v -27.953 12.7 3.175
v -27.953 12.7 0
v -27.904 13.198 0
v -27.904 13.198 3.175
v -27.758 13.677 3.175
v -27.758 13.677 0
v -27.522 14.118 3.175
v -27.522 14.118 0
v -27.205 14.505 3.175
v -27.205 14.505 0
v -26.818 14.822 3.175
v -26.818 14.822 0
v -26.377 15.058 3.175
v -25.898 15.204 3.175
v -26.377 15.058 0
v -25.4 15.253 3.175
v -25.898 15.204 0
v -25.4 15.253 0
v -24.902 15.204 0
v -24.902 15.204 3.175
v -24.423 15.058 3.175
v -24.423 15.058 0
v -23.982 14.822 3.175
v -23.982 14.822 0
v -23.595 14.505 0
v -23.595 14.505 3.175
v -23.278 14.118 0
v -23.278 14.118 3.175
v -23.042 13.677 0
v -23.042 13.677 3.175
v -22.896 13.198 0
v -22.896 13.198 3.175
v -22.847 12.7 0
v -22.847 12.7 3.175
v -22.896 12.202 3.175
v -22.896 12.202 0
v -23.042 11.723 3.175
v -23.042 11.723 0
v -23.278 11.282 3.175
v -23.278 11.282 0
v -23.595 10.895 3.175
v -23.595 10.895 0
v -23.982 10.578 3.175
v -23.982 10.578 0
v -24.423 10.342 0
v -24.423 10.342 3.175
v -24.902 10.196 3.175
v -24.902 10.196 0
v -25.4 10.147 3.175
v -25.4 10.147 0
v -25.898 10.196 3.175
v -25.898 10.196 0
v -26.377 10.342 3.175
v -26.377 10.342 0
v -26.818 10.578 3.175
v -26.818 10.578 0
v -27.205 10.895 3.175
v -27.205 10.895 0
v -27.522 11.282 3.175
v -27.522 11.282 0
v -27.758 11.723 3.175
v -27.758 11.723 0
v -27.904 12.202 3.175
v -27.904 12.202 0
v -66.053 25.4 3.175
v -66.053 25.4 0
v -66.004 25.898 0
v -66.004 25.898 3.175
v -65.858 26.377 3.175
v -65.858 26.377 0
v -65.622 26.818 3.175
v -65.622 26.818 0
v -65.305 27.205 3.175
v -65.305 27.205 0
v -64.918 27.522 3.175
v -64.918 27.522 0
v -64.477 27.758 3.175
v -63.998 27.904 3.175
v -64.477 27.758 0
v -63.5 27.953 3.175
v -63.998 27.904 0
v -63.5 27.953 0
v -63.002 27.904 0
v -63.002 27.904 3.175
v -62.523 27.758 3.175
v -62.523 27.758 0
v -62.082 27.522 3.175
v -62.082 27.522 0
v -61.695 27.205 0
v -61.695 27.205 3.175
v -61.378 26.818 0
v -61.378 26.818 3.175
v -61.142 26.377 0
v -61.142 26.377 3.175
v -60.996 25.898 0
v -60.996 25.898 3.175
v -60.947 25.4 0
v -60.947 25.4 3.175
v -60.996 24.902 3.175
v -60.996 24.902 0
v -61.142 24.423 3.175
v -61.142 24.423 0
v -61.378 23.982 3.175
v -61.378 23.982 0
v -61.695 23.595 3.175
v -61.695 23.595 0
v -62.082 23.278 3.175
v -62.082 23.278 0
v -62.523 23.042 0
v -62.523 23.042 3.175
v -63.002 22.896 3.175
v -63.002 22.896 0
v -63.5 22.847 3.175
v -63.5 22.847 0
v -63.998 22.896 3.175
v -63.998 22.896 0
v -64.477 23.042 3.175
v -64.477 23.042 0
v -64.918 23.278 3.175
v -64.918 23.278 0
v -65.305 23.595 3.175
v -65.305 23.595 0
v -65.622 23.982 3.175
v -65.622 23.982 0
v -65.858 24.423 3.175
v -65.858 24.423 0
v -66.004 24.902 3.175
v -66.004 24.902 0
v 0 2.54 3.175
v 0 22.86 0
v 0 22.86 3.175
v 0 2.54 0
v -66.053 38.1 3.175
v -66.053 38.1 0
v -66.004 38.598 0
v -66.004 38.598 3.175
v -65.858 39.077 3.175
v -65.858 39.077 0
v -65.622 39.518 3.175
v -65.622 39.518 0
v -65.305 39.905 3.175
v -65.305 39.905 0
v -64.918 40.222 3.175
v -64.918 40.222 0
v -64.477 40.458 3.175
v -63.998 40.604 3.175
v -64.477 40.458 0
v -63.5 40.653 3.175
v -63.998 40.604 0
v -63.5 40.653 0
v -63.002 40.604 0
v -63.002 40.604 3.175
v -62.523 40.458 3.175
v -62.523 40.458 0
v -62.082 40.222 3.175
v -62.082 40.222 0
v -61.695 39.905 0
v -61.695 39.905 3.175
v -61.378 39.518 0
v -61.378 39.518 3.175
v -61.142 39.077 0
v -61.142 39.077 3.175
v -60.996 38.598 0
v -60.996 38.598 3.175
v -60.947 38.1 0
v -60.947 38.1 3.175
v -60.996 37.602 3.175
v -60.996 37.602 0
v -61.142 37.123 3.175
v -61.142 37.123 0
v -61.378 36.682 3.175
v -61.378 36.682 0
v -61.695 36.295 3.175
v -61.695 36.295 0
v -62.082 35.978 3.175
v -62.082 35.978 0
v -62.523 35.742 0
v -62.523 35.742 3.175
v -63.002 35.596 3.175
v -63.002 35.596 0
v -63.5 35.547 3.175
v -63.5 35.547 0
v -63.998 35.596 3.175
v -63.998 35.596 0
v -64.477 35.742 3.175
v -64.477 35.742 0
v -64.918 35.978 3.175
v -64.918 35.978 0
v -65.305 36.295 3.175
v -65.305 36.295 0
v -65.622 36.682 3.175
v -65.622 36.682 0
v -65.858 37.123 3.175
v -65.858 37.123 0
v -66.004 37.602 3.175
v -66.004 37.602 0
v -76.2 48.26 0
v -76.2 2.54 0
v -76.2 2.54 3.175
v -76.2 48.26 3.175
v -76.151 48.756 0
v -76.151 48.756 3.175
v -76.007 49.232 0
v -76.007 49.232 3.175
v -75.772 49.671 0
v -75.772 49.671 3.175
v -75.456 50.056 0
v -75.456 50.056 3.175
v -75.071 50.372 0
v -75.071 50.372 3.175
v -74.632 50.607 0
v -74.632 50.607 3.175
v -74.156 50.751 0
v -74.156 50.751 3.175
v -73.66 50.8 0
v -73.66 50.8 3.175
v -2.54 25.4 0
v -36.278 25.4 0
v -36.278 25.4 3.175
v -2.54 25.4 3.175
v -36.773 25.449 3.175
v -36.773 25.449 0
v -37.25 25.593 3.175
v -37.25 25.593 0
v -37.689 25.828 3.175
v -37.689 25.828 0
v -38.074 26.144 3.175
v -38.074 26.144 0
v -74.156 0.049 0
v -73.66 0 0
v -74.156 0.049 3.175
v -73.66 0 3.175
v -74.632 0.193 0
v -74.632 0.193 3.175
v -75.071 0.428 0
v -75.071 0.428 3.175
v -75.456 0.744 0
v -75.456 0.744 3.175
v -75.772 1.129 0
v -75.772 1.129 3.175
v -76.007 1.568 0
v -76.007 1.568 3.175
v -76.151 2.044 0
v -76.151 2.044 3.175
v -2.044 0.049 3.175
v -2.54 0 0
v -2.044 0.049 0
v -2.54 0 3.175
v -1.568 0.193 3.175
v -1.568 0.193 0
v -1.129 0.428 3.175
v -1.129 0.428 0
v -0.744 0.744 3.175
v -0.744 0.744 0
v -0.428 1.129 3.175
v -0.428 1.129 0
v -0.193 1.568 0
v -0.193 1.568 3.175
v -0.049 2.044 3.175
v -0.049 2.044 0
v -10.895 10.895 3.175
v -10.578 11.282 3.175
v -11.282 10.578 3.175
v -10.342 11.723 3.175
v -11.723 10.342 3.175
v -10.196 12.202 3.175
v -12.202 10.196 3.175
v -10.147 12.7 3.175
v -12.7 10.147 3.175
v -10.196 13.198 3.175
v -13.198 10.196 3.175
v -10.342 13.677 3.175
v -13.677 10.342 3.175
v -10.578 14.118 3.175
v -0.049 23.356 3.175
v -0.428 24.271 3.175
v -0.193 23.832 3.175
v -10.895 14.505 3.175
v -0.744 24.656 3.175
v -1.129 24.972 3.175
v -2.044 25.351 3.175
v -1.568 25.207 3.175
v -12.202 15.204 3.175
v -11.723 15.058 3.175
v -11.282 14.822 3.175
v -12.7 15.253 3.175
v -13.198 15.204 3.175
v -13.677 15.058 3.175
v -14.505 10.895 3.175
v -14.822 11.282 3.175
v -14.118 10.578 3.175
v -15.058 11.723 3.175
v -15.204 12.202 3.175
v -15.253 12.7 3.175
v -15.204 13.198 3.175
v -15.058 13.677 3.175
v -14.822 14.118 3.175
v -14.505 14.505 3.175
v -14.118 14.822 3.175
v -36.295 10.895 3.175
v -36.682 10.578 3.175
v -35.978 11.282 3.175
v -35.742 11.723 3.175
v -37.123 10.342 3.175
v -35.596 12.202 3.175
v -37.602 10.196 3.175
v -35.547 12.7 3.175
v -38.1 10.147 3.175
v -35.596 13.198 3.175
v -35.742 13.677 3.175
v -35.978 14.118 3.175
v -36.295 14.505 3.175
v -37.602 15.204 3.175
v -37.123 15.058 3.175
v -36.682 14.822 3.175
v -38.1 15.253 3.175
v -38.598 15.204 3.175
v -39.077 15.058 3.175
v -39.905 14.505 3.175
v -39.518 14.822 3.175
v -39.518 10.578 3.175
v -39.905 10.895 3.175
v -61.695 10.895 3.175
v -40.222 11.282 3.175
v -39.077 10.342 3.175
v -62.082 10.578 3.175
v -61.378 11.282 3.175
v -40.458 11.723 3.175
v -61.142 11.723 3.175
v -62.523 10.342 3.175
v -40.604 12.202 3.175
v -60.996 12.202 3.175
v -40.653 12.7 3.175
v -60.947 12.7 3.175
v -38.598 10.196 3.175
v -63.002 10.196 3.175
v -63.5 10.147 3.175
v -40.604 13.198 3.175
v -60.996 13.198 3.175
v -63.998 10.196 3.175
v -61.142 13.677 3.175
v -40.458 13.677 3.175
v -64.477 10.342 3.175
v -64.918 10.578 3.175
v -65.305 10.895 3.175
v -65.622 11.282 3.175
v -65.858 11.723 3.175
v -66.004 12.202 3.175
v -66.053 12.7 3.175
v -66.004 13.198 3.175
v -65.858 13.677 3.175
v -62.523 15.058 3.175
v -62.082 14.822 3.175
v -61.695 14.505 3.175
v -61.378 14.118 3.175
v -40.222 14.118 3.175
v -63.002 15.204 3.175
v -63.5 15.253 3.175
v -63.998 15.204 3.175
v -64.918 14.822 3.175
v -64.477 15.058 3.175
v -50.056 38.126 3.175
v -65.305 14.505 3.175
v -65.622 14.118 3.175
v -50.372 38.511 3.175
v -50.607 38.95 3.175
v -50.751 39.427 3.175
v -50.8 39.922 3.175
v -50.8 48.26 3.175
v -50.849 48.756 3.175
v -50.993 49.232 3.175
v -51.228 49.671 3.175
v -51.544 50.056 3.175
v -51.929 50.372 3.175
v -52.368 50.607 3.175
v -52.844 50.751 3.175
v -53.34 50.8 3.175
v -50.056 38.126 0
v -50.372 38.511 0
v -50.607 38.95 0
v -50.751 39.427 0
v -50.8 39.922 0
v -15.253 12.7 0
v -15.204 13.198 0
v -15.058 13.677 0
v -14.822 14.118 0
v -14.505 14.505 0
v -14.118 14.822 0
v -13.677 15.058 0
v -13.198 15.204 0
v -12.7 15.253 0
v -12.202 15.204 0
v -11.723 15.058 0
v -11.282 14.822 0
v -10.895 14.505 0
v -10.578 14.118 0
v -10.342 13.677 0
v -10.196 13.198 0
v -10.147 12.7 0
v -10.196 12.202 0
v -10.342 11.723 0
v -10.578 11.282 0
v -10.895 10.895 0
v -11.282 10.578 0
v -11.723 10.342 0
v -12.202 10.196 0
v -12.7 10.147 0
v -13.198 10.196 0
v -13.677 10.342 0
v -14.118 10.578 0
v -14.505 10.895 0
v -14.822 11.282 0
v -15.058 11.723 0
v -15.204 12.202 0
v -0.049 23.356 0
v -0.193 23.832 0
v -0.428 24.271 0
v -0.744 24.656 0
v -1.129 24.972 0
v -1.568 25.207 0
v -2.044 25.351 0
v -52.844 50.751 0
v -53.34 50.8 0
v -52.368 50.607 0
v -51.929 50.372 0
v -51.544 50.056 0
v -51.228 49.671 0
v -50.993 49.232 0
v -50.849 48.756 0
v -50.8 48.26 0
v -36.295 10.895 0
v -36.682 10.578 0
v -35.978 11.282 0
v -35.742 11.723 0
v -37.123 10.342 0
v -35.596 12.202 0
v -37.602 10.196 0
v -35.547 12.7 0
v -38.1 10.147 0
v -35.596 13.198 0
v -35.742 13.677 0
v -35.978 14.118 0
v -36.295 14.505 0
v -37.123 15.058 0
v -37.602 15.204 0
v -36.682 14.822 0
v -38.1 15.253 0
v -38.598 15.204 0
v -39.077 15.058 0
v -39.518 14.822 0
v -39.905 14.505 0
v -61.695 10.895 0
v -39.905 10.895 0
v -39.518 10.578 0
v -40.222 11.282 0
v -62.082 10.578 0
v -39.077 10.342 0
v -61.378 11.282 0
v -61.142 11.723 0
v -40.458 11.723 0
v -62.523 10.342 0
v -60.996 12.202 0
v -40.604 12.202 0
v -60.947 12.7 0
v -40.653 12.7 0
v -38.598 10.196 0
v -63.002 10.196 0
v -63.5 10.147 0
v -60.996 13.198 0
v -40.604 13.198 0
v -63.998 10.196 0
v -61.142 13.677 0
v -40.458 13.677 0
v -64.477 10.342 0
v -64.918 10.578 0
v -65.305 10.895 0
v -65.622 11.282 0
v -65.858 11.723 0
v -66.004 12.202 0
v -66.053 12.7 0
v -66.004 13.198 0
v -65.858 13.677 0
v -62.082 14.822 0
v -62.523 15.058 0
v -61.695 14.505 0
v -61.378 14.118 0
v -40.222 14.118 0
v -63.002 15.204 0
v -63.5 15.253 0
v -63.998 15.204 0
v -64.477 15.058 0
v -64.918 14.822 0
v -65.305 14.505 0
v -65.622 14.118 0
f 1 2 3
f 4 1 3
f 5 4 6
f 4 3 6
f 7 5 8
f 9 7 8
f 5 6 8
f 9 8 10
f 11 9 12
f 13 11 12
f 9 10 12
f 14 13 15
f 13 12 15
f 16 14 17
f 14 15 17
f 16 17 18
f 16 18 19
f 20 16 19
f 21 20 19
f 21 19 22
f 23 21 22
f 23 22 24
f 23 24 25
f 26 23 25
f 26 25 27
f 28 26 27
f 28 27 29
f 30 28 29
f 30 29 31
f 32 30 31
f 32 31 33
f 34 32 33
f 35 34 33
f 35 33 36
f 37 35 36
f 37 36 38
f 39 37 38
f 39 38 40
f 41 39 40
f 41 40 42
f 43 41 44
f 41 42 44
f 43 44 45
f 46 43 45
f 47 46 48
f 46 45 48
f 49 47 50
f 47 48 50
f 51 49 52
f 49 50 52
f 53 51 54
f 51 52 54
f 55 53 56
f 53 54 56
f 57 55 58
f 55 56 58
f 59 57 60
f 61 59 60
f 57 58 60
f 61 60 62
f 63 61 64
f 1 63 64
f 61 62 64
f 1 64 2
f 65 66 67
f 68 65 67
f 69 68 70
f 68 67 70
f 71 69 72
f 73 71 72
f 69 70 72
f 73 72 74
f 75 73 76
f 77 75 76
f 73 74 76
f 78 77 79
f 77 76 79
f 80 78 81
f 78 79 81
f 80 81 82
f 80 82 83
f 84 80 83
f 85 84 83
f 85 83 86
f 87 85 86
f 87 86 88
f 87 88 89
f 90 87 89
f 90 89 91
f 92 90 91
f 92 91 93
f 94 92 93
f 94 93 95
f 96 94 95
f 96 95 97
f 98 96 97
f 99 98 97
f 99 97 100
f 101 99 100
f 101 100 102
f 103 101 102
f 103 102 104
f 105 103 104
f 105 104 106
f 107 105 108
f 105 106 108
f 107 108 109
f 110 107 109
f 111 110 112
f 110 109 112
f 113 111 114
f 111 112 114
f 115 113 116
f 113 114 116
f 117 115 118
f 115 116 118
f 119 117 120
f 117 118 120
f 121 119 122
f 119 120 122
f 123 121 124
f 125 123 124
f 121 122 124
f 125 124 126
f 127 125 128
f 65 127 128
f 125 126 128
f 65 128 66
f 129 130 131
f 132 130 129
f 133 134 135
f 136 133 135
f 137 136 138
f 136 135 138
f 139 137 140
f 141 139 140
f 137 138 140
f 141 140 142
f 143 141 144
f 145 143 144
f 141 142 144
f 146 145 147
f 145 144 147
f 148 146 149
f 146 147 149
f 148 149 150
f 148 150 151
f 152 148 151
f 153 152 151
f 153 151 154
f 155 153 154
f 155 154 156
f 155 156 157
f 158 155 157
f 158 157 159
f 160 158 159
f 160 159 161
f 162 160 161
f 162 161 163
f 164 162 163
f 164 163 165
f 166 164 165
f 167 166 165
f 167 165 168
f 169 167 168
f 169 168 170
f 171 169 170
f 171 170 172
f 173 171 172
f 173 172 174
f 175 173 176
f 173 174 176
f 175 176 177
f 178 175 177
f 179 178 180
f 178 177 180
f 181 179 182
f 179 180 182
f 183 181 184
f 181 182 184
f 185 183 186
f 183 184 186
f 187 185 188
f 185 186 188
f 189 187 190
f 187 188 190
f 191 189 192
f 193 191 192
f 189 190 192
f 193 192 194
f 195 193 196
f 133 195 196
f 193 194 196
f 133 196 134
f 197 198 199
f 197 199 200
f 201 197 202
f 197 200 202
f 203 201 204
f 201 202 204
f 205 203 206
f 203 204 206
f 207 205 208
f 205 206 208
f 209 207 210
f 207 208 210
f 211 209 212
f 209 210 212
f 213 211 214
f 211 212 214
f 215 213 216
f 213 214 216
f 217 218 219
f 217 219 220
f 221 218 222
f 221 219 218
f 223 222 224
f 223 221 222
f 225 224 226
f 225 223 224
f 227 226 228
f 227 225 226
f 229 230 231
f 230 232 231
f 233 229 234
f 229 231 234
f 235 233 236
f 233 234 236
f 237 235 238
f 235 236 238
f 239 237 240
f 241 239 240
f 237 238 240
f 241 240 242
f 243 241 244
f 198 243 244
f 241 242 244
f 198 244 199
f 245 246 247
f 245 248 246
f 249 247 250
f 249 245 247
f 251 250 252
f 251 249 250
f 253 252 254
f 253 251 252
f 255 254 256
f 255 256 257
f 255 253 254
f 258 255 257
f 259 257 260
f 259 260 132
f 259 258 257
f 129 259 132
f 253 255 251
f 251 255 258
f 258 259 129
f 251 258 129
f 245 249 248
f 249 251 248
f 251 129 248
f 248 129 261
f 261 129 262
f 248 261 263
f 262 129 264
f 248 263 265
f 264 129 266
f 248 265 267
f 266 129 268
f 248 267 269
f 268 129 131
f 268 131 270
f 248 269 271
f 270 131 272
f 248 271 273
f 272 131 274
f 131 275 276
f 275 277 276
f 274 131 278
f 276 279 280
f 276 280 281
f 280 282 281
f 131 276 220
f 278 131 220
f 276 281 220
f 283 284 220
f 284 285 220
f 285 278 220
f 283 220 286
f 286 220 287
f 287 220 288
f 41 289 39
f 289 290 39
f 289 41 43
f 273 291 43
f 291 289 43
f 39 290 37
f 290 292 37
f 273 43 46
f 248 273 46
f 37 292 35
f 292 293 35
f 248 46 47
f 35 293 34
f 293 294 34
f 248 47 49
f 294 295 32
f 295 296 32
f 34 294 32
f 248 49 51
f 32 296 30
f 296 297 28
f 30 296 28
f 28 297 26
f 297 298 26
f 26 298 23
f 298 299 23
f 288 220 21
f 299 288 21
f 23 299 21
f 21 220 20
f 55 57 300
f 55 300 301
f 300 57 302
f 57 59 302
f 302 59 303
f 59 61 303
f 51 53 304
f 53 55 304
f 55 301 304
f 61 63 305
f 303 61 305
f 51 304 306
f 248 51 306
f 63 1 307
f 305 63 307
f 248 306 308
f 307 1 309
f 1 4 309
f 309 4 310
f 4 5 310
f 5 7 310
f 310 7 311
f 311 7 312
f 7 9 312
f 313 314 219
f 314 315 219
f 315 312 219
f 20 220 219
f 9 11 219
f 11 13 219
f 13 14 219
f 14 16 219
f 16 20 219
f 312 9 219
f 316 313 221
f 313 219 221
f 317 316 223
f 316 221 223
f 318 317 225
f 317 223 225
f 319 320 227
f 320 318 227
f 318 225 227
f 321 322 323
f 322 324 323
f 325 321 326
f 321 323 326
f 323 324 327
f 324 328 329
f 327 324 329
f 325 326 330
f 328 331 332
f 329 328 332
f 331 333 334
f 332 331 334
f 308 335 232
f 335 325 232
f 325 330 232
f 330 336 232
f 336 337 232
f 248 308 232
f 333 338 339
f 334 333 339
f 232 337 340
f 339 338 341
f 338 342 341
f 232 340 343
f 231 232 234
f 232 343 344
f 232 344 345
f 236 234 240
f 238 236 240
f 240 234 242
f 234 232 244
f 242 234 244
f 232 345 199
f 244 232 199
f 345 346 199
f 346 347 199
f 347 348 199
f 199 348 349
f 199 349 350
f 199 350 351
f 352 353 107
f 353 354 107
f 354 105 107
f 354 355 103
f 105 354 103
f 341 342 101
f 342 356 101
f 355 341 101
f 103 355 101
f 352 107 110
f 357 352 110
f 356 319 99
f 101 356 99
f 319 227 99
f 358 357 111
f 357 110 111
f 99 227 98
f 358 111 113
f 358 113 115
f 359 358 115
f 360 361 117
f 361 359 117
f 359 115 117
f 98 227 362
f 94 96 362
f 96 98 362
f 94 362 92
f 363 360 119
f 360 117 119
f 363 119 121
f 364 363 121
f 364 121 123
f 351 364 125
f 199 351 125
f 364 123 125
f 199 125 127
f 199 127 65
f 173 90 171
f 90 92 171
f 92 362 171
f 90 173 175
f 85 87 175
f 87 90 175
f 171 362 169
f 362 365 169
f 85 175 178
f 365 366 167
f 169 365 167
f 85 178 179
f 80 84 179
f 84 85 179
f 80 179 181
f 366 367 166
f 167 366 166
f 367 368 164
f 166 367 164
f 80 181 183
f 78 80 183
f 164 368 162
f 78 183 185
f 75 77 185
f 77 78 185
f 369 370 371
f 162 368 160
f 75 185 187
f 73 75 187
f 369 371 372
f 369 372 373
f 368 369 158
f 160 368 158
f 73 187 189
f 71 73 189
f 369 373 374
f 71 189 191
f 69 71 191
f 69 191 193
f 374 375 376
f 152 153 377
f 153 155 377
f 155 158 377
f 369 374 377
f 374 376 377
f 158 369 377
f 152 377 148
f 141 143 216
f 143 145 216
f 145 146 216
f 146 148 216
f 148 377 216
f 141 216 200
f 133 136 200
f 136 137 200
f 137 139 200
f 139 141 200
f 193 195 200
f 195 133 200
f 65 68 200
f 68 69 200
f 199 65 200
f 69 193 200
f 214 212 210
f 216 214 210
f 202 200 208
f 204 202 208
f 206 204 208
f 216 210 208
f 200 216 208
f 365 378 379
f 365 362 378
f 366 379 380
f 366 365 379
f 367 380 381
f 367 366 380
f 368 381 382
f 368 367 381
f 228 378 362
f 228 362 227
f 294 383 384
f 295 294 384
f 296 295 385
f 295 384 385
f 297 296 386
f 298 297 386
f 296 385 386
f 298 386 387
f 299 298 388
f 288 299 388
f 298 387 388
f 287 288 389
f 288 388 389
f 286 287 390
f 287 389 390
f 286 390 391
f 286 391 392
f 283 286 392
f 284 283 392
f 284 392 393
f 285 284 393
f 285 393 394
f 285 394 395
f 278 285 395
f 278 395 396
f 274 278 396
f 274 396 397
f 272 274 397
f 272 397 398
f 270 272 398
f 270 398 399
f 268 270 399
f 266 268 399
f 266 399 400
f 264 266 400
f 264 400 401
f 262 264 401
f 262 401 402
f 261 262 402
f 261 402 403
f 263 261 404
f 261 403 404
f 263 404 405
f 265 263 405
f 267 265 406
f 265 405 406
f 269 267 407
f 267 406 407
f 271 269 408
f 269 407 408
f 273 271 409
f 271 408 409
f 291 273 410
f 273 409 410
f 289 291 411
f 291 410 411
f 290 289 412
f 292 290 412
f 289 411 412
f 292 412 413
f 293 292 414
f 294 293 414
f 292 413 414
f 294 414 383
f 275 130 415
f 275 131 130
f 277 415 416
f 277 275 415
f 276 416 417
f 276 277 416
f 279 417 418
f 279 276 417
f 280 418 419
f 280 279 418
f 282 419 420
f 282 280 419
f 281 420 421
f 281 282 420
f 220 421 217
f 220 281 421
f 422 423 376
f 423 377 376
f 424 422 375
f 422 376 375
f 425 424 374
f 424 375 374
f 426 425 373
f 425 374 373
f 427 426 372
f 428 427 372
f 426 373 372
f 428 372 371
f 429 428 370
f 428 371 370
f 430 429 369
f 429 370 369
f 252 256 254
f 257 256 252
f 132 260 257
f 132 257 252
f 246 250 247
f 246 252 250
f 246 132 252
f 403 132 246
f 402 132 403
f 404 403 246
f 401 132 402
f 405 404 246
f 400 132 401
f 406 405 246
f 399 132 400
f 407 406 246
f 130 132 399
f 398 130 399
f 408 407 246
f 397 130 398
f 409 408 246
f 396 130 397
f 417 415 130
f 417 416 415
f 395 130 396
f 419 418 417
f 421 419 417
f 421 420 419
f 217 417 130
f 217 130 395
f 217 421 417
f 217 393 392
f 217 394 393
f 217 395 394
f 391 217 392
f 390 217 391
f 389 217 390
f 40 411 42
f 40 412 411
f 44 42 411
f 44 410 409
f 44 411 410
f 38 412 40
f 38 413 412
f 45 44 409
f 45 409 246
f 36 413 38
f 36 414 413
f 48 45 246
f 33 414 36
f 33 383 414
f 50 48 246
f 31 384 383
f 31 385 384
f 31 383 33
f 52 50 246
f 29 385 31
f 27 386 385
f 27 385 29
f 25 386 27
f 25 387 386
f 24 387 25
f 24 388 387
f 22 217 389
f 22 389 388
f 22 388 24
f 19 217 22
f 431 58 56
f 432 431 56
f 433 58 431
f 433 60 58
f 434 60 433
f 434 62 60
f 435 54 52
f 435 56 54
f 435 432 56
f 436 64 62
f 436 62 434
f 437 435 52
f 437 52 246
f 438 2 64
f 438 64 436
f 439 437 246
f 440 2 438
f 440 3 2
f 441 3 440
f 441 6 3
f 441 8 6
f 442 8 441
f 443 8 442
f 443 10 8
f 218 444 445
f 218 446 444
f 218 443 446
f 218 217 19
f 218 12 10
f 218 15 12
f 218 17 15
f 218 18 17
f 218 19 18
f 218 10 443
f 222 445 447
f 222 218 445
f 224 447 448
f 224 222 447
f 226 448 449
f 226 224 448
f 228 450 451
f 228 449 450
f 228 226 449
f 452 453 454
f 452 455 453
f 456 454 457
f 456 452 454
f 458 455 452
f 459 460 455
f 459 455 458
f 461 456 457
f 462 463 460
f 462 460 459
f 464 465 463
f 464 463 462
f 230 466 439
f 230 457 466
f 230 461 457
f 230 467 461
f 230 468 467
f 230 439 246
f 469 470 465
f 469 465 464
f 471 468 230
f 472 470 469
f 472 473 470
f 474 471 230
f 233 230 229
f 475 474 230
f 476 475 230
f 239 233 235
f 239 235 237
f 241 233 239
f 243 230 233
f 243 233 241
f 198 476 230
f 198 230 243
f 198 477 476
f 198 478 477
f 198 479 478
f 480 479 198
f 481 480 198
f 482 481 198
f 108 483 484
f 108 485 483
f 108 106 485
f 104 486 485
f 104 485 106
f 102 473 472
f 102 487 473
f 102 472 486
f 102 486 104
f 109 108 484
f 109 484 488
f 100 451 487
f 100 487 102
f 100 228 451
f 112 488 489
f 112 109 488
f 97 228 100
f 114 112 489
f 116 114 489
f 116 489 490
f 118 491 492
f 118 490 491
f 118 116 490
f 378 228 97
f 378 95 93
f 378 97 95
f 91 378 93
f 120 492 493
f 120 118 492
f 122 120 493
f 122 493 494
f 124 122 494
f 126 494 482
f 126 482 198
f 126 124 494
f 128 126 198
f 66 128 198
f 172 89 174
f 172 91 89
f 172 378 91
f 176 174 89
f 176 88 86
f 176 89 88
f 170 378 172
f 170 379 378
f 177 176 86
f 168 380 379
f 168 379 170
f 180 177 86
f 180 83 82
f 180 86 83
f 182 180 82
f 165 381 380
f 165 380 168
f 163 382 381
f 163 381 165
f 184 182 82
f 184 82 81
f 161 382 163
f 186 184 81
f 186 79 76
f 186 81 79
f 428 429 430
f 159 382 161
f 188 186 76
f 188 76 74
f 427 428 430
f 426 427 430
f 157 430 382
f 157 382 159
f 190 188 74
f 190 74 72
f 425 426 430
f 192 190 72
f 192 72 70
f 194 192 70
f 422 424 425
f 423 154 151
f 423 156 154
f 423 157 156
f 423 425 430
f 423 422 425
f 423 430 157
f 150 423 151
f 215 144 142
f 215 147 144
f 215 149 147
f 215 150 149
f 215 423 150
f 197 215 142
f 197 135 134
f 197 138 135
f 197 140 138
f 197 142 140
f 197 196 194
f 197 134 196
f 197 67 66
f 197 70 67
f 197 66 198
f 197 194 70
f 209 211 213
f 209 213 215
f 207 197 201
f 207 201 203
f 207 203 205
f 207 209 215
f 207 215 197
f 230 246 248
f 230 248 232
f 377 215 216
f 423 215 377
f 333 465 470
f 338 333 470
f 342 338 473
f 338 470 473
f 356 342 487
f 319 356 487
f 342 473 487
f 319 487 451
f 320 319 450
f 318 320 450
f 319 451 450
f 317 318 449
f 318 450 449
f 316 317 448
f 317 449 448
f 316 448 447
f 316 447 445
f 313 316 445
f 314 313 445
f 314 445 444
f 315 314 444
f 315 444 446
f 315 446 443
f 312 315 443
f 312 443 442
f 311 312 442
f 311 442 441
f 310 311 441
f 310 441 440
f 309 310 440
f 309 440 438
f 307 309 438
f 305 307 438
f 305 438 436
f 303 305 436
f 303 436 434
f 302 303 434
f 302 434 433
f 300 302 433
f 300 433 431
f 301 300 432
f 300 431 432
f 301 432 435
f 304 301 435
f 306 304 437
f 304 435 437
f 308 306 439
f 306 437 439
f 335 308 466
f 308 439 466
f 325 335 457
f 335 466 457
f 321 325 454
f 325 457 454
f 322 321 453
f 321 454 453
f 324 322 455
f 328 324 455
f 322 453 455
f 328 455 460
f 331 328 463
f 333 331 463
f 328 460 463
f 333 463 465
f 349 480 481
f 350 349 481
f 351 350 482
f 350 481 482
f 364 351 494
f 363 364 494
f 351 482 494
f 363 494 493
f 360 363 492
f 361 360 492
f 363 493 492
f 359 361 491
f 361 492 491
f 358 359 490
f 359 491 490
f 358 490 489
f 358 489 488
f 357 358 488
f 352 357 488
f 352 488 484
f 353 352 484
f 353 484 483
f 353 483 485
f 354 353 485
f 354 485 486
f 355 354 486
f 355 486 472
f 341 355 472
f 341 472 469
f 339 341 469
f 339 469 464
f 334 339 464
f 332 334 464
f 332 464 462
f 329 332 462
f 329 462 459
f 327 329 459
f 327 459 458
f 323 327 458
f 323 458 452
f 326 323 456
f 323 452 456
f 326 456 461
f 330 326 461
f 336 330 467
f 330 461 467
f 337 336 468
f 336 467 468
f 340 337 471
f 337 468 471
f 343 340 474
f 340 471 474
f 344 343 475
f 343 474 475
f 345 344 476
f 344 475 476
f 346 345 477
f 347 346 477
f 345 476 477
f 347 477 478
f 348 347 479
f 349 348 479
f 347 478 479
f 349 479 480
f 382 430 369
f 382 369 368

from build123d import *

# Parameters (mm, degrees)
BOSS_EXTRUDE1_DEPTH    = 3.175
F_10_CLEARANCE_HOLE1_D = 5.1054
FILLET1_R              = 2.54


with BuildPart() as part:
    # Sketch1 → Boss-Extrude1 (new body)
    with BuildSketch(Plane.XY):
        Polygon((0, 0), (-76.2, 0), (-76.2, 50.8), (-50.8, 50.8), (-50.8, 38.870384182), (-37.329615818, 25.4), (0, 25.4), align=None)
    extrude(amount=BOSS_EXTRUDE1_DEPTH)

    # #10 Clearance Hole1 (through all)
    with Locations(Plane.XY.offset(3.175)):
        with Locations((-63.5, 38.1), (-63.5, 25.4), (-63.5, 12.7), (-38.1, 12.7), (-25.4, 12.7), (-12.7, 12.7)):
            Hole(F_10_CLEARANCE_HOLE1_D / 2)

    # Fillet1
    fillet1_edges = [part.edges().sort_by_distance(p)[0] for p in [
        (-37.329615818, 25.4, 1.5875),
        (0, 25.4, 1.5875),
        (0, 0, 1.5875),
        (-76.2, 0, 1.5875),
        (-76.2, 50.8, 1.5875),
        (-50.8, 50.8, 1.5875),
        (-50.8, 38.870384182, 1.5875),
    ]]
    fillet(fillet1_edges, radius=FILLET1_R)


solid = part.part
